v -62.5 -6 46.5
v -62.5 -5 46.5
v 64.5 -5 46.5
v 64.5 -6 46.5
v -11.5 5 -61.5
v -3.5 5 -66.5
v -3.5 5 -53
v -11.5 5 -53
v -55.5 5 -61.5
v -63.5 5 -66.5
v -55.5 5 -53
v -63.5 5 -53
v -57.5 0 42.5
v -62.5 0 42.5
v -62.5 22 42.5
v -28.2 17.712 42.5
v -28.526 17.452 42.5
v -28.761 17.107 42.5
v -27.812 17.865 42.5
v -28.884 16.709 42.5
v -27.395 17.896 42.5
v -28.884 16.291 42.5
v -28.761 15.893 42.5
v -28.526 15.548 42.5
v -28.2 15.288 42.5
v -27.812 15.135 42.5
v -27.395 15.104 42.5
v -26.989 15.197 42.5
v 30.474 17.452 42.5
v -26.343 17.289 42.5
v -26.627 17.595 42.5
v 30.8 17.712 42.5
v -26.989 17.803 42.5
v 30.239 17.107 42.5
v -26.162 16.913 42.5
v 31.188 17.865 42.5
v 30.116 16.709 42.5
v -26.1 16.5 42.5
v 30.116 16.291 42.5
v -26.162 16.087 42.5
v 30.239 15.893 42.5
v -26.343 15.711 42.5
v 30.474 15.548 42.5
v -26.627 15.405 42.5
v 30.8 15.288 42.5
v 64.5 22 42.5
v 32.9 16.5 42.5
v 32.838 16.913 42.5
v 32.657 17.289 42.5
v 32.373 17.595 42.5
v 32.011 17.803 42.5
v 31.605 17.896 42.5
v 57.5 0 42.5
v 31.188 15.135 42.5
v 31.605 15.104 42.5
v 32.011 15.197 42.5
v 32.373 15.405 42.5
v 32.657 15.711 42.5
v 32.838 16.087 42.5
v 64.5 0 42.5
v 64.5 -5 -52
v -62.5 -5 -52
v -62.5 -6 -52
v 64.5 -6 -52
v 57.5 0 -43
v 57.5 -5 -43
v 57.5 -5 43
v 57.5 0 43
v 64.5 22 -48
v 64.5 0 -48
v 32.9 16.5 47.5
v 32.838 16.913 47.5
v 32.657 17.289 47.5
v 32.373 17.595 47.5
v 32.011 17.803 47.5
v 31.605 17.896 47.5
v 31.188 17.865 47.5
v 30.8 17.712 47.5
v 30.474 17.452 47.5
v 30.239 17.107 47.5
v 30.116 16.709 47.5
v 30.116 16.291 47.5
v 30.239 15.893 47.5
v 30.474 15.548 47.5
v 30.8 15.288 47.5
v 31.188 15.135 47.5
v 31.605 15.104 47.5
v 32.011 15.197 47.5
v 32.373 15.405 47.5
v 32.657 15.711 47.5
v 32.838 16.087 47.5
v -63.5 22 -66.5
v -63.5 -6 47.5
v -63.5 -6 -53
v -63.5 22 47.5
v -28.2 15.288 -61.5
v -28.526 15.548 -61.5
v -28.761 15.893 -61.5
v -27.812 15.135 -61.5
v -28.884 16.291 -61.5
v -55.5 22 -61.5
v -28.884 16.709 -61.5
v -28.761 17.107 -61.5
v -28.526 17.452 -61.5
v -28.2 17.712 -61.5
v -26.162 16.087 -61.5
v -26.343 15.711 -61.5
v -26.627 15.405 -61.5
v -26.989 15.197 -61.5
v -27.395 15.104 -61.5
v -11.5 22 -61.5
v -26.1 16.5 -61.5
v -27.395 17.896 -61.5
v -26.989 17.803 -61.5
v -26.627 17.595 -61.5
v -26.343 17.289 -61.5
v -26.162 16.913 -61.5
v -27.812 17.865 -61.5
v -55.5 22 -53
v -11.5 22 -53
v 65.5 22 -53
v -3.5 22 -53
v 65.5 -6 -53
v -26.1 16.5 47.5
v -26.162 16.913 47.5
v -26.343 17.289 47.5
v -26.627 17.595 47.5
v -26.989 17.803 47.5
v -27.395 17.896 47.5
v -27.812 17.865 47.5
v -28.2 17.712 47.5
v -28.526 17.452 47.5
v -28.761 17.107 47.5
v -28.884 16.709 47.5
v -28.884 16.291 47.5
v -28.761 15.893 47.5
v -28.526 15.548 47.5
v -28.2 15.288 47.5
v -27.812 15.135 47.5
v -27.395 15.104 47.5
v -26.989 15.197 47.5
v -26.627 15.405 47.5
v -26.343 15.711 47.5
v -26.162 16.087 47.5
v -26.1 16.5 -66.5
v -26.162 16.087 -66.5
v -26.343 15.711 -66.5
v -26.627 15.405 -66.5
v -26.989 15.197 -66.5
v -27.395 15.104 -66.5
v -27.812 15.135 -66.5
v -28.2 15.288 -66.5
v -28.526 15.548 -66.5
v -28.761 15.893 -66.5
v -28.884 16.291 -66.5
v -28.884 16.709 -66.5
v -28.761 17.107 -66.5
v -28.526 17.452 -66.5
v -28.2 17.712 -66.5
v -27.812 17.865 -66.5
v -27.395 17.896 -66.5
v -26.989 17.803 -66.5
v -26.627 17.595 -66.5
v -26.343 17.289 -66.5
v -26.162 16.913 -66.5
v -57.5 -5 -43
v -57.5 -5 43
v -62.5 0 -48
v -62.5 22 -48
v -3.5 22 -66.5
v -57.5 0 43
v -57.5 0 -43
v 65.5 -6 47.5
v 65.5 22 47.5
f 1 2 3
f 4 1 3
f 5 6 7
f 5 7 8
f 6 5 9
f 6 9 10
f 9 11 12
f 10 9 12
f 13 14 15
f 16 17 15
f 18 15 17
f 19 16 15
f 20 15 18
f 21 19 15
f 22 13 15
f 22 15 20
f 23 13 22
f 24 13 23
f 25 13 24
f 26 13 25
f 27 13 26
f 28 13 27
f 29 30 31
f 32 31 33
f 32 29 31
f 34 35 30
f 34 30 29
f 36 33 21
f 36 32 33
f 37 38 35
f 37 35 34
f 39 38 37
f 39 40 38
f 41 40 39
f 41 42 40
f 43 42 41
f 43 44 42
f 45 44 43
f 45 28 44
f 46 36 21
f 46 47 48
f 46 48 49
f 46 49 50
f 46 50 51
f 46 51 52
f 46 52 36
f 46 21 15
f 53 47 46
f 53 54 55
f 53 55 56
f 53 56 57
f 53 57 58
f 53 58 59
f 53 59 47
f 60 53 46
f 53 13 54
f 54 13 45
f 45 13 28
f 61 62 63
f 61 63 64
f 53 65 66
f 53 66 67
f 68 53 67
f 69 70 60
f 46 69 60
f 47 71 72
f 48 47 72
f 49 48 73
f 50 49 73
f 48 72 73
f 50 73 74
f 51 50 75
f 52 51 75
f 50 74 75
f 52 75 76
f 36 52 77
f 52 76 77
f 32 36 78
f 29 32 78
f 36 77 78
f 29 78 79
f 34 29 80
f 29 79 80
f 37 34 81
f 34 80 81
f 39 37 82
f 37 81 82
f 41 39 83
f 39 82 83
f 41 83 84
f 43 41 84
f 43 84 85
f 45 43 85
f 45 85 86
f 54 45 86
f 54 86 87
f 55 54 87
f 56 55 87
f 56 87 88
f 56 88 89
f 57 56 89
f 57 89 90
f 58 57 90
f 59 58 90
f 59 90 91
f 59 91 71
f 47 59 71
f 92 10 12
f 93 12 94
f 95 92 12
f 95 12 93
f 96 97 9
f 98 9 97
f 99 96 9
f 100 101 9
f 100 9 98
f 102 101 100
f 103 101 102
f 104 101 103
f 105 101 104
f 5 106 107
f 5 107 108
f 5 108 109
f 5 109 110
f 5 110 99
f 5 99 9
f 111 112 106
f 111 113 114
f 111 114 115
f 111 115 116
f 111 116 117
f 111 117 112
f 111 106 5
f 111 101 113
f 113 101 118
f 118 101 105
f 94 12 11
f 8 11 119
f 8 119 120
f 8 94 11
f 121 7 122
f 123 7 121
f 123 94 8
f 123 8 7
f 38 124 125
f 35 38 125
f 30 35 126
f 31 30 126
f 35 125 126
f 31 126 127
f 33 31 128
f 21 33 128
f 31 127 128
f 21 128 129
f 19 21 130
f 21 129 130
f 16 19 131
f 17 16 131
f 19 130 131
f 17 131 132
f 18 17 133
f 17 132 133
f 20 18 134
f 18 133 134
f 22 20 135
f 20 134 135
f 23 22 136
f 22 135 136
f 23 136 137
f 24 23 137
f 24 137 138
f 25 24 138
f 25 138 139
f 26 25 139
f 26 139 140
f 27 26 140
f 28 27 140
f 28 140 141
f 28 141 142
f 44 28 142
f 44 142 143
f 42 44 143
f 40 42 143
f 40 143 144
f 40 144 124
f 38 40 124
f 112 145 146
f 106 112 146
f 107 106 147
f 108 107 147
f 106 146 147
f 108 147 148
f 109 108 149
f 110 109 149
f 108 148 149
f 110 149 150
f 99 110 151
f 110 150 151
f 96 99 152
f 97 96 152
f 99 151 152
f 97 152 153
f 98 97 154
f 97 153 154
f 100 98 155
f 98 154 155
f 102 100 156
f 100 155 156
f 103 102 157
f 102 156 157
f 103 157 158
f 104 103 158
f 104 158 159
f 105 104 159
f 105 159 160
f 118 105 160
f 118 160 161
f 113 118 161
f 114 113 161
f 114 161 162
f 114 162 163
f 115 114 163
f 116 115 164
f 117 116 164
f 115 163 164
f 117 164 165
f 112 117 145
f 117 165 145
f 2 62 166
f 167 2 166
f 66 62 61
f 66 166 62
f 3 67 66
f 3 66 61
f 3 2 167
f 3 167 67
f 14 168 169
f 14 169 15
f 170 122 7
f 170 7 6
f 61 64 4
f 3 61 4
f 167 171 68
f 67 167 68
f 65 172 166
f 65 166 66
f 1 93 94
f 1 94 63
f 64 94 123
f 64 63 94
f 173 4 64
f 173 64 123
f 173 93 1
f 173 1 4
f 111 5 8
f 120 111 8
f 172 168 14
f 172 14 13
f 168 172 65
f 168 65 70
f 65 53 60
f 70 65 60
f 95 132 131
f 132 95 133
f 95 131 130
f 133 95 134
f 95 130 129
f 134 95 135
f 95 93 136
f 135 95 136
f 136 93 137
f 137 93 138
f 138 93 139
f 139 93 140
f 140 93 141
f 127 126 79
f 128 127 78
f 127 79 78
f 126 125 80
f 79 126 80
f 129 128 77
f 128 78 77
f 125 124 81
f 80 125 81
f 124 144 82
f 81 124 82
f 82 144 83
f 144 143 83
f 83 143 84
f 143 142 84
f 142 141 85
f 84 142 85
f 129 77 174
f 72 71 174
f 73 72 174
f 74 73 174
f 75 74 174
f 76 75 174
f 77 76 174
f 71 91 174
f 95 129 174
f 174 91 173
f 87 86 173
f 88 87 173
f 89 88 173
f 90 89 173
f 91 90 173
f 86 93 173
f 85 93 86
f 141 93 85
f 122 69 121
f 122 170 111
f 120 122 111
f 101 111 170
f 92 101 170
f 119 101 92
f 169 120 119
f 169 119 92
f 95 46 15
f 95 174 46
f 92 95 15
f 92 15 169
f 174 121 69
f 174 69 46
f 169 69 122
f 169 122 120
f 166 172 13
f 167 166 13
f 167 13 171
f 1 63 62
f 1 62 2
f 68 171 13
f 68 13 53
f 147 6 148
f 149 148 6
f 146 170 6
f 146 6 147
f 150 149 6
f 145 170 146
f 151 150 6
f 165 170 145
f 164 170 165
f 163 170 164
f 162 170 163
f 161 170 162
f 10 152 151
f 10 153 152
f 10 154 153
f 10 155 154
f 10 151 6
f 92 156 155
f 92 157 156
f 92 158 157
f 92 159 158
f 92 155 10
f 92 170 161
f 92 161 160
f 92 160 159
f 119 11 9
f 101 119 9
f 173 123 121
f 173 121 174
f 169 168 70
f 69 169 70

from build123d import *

# Parameters (mm, degrees)
F1_W      = 129
F1_H      = 100.5
F1_W_2    = 127
F1_H_2    = 98.5
F2_DEPTH  = 6
F3_W      = 129
F3_H      = 100.5
F3_W_2    = 127
F3_H_2    = 90.5
F4_DEPTH  = 22
F6_DEPTH  = 17
F7_R      = 1.4
F8_DEPTH  = 7.9
F9_R      = 1.4
F10_DEPTH = 5
F11_W     = 127
F11_H     = 98.5
F11_W_2   = 115
F11_H_2   = 86
F12_DEPTH = 5


with BuildPart() as f2:
    # F1 (on Front) → F2 (new body)
    with BuildSketch(Plane.XZ):
        with Locations((1, -2.75)):
            Rectangle(F1_W, F1_H)
        with Locations((1, -2.75)):
            Rectangle(F1_W_2, F1_H_2, mode=Mode.SUBTRACT)
    extrude(amount=F2_DEPTH)

    # F3 (on Front) → F4 (join)
    with BuildSketch(Plane.XZ):
        with Locations((1, -2.75)):
            Rectangle(F3_W, F3_H)
        with Locations((1, -2.75)):
            Rectangle(F3_W_2, F3_H_2, mode=Mode.SUBTRACT)
    extrude(amount=-F4_DEPTH)

    # F5 (on face) → F6 (join)
    with BuildSketch(Plane(origin=(0, 22, 0), x_dir=(-1, 0, 0), z_dir=(0, 1, 0))):
        Polygon((3.5, -66.5), (63.5, -66.5), (63.5, -53), (55.5, -53), (55.5, -61.5), (11.5, -61.5), (11.5, -53), (3.5, -53), align=None)
    extrude(amount=-F6_DEPTH)

    # F7 (on face) → F8 (cut)
    with BuildSketch(Plane.XY.offset(47.5)):
        with Locations((-27.5, 16.5)):
            Circle(F7_R)
        with Locations((31.5, 16.5)):
            Circle(F7_R)
    extrude(amount=-F8_DEPTH, mode=Mode.SUBTRACT)

    # F9 (on face) → F10 (cut)
    with BuildSketch(Plane(origin=(0, 0, -66.5), x_dir=(1, 0, 0), z_dir=(0, 0, -1))):
        with Locations((-27.5, -16.5)):
            Circle(F9_R)
    extrude(amount=-F10_DEPTH, mode=Mode.SUBTRACT)

    # F11 (on face) → F12 (join)
    with BuildSketch(Plane.XZ):
        with Locations((1, -2.75)):
            Rectangle(F11_W, F11_H)
        Rectangle(F11_W_2, F11_H_2, mode=Mode.SUBTRACT)
    extrude(amount=F12_DEPTH)


solid = f2.part
